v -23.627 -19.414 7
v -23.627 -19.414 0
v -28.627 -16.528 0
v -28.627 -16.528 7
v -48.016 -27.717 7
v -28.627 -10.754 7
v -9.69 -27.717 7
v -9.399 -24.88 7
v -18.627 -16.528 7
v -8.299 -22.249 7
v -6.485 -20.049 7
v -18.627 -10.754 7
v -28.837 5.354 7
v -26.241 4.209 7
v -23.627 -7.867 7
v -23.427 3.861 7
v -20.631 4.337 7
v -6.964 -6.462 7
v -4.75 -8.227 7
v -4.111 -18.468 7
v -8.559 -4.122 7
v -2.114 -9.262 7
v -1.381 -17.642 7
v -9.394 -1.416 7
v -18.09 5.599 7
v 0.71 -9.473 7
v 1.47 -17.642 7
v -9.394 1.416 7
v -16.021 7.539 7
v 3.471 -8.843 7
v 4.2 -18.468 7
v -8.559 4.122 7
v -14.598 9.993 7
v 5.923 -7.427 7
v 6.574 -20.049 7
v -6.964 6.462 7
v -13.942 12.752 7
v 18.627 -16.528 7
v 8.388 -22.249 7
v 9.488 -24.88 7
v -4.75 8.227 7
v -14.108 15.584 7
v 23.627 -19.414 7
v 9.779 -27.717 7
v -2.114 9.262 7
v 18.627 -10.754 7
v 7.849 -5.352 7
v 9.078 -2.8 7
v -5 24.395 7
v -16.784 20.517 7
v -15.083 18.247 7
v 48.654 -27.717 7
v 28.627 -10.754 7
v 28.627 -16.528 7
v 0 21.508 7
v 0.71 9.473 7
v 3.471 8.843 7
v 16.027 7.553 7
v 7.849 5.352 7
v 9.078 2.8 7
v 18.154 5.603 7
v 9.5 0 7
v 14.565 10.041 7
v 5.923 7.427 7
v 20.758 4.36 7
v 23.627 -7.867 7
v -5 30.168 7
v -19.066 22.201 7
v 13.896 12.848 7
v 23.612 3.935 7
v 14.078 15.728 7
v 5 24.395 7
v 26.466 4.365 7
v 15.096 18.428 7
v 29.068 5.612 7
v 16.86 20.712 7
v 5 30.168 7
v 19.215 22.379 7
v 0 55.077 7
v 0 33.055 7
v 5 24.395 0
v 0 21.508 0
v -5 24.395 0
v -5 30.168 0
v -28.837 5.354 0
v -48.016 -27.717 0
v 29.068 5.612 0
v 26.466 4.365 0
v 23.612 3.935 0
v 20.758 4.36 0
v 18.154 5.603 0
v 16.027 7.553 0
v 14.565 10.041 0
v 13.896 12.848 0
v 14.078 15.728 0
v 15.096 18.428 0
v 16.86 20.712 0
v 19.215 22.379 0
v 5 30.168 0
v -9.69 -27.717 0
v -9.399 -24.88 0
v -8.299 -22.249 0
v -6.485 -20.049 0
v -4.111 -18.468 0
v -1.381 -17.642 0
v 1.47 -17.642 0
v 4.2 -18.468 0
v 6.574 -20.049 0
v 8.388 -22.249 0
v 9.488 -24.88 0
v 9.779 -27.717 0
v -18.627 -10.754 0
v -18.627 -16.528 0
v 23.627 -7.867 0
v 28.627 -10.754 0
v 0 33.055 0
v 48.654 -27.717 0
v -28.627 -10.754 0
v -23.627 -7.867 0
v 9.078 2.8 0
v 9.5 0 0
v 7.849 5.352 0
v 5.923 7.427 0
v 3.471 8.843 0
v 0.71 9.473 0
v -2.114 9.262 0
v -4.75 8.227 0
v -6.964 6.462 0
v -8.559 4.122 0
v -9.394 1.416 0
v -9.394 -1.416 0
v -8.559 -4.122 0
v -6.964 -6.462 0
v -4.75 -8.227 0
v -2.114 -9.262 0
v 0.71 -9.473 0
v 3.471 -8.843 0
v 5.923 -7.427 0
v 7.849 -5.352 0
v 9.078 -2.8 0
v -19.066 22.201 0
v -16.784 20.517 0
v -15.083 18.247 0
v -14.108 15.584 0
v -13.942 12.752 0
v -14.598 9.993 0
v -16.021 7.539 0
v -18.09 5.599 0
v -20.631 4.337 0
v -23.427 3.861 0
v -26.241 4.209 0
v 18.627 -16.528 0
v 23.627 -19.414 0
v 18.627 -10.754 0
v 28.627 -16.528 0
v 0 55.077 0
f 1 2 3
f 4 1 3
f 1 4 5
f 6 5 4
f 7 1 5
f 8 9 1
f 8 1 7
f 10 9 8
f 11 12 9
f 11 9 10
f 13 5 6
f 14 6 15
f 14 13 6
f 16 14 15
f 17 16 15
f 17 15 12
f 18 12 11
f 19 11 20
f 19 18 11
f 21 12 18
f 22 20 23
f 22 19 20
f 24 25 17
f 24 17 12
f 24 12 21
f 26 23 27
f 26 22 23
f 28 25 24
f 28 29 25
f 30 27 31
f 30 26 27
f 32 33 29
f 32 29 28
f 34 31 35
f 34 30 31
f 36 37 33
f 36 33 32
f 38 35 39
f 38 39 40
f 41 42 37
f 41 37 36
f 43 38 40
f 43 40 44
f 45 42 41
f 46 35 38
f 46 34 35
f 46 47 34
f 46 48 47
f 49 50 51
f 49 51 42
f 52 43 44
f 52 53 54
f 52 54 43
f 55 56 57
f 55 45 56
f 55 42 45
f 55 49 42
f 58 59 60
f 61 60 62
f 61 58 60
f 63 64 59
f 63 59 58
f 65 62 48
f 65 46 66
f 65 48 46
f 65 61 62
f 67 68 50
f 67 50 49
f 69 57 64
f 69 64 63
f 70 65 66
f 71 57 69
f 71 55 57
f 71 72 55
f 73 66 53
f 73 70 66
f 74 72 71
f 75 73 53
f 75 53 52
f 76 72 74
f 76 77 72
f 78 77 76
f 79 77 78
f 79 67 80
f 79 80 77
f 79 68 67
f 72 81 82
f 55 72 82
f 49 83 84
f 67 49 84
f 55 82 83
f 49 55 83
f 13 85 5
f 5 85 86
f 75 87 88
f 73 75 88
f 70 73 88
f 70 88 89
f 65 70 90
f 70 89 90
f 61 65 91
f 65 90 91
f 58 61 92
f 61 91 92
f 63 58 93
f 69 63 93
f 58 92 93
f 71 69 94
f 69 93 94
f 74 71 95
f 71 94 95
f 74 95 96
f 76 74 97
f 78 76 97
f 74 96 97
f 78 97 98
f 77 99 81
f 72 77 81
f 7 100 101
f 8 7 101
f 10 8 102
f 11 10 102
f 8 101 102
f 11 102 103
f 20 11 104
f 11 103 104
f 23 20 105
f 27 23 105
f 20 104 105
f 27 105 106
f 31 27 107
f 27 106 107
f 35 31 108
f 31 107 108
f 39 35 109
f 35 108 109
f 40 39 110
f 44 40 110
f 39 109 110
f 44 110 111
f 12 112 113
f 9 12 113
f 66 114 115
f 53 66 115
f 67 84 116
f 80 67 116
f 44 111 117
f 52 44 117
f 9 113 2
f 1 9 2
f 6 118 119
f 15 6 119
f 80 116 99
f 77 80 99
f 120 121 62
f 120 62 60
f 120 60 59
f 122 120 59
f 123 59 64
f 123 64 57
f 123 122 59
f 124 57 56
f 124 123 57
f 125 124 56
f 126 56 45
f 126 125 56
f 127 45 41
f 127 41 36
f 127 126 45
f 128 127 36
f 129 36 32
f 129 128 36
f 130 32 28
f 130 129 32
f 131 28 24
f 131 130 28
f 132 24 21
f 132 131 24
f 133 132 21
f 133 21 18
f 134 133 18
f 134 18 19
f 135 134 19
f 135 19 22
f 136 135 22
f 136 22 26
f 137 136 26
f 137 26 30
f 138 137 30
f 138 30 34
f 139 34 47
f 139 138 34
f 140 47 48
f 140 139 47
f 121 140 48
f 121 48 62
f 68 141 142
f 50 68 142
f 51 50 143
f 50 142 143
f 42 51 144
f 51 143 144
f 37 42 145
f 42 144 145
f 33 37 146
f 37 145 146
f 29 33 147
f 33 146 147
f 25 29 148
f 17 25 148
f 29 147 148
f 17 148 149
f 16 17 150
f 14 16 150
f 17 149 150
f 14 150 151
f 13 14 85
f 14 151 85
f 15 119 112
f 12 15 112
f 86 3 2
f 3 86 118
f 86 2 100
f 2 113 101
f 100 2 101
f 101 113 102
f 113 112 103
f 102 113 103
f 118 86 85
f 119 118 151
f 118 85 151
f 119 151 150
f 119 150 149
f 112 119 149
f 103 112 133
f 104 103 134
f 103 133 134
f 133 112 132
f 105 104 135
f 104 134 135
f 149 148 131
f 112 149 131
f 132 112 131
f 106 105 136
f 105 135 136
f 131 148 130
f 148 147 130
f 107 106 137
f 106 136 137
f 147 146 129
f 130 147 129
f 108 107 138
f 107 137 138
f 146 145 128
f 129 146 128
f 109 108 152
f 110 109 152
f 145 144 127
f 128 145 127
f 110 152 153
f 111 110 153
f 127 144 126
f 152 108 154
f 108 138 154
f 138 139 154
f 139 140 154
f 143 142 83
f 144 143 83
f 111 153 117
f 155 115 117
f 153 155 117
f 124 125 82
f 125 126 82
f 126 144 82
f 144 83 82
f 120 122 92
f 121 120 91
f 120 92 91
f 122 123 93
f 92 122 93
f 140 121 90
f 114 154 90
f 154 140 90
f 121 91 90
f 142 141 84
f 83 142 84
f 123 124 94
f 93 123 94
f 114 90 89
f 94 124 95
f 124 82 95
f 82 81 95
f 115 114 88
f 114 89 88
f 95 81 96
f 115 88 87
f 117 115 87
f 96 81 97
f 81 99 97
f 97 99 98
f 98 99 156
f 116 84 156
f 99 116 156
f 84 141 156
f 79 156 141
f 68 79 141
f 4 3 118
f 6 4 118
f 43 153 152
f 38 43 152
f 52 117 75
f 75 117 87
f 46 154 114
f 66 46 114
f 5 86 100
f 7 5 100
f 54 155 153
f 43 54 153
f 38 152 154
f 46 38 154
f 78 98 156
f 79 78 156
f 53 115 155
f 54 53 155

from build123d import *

# Parameters (mm, degrees)
F0_R     = 9.5
F1_DEPTH = 7


with BuildPart() as f1:
    # F0 (on Top) → F1 (new body)
    with BuildSketch(Plane.XY):
        with BuildLine():
            Line((19.215132, 22.378807), (0, 55.077419))
            Line((0, 55.077419), (-19.066227, 22.201317))
            ThreePointArc((-19.066227, 22.201317), (-15.219751, 8.713844), (-28.836632, 5.354102))
            Line((-28.836632, 5.354102), (-48.016034, -27.717147))
            Line((-48.016034, -27.717147), (-9.689672, -27.717147))
            ThreePointArc((-9.689672, -27.717147), (0.044547, -17.537595), (9.778766, -27.717147))
            Line((9.778766, -27.717147), (48.653703, -27.717147))
            Line((48.653703, -27.717147), (29.068287, 5.61158))
            ThreePointArc((29.068287, 5.61158), (15.203422, 8.742665), (19.215132, 22.378807))
        make_face()
        Polygon((-23.626551, -19.414298), (-28.626551, -16.527547), (-28.626551, -10.754044), (-23.626551, -7.867293), (-18.626551, -10.754044), (-18.626551, -16.527547), align=None, mode=Mode.SUBTRACT)
        Circle(F0_R, mode=Mode.SUBTRACT)
        Polygon((28.626551, -10.754044), (28.626551, -16.527547), (23.626551, -19.414298), (18.626551, -16.527547), (18.626551, -10.754044), (23.626551, -7.867293), align=None, mode=Mode.SUBTRACT)
        Polygon((-5, 30.168342), (0, 33.055094), (5, 30.168342), (5, 24.39484), (0, 21.508088), (-5, 24.39484), align=None, mode=Mode.SUBTRACT)
    extrude(amount=F1_DEPTH)


solid = f1.part
